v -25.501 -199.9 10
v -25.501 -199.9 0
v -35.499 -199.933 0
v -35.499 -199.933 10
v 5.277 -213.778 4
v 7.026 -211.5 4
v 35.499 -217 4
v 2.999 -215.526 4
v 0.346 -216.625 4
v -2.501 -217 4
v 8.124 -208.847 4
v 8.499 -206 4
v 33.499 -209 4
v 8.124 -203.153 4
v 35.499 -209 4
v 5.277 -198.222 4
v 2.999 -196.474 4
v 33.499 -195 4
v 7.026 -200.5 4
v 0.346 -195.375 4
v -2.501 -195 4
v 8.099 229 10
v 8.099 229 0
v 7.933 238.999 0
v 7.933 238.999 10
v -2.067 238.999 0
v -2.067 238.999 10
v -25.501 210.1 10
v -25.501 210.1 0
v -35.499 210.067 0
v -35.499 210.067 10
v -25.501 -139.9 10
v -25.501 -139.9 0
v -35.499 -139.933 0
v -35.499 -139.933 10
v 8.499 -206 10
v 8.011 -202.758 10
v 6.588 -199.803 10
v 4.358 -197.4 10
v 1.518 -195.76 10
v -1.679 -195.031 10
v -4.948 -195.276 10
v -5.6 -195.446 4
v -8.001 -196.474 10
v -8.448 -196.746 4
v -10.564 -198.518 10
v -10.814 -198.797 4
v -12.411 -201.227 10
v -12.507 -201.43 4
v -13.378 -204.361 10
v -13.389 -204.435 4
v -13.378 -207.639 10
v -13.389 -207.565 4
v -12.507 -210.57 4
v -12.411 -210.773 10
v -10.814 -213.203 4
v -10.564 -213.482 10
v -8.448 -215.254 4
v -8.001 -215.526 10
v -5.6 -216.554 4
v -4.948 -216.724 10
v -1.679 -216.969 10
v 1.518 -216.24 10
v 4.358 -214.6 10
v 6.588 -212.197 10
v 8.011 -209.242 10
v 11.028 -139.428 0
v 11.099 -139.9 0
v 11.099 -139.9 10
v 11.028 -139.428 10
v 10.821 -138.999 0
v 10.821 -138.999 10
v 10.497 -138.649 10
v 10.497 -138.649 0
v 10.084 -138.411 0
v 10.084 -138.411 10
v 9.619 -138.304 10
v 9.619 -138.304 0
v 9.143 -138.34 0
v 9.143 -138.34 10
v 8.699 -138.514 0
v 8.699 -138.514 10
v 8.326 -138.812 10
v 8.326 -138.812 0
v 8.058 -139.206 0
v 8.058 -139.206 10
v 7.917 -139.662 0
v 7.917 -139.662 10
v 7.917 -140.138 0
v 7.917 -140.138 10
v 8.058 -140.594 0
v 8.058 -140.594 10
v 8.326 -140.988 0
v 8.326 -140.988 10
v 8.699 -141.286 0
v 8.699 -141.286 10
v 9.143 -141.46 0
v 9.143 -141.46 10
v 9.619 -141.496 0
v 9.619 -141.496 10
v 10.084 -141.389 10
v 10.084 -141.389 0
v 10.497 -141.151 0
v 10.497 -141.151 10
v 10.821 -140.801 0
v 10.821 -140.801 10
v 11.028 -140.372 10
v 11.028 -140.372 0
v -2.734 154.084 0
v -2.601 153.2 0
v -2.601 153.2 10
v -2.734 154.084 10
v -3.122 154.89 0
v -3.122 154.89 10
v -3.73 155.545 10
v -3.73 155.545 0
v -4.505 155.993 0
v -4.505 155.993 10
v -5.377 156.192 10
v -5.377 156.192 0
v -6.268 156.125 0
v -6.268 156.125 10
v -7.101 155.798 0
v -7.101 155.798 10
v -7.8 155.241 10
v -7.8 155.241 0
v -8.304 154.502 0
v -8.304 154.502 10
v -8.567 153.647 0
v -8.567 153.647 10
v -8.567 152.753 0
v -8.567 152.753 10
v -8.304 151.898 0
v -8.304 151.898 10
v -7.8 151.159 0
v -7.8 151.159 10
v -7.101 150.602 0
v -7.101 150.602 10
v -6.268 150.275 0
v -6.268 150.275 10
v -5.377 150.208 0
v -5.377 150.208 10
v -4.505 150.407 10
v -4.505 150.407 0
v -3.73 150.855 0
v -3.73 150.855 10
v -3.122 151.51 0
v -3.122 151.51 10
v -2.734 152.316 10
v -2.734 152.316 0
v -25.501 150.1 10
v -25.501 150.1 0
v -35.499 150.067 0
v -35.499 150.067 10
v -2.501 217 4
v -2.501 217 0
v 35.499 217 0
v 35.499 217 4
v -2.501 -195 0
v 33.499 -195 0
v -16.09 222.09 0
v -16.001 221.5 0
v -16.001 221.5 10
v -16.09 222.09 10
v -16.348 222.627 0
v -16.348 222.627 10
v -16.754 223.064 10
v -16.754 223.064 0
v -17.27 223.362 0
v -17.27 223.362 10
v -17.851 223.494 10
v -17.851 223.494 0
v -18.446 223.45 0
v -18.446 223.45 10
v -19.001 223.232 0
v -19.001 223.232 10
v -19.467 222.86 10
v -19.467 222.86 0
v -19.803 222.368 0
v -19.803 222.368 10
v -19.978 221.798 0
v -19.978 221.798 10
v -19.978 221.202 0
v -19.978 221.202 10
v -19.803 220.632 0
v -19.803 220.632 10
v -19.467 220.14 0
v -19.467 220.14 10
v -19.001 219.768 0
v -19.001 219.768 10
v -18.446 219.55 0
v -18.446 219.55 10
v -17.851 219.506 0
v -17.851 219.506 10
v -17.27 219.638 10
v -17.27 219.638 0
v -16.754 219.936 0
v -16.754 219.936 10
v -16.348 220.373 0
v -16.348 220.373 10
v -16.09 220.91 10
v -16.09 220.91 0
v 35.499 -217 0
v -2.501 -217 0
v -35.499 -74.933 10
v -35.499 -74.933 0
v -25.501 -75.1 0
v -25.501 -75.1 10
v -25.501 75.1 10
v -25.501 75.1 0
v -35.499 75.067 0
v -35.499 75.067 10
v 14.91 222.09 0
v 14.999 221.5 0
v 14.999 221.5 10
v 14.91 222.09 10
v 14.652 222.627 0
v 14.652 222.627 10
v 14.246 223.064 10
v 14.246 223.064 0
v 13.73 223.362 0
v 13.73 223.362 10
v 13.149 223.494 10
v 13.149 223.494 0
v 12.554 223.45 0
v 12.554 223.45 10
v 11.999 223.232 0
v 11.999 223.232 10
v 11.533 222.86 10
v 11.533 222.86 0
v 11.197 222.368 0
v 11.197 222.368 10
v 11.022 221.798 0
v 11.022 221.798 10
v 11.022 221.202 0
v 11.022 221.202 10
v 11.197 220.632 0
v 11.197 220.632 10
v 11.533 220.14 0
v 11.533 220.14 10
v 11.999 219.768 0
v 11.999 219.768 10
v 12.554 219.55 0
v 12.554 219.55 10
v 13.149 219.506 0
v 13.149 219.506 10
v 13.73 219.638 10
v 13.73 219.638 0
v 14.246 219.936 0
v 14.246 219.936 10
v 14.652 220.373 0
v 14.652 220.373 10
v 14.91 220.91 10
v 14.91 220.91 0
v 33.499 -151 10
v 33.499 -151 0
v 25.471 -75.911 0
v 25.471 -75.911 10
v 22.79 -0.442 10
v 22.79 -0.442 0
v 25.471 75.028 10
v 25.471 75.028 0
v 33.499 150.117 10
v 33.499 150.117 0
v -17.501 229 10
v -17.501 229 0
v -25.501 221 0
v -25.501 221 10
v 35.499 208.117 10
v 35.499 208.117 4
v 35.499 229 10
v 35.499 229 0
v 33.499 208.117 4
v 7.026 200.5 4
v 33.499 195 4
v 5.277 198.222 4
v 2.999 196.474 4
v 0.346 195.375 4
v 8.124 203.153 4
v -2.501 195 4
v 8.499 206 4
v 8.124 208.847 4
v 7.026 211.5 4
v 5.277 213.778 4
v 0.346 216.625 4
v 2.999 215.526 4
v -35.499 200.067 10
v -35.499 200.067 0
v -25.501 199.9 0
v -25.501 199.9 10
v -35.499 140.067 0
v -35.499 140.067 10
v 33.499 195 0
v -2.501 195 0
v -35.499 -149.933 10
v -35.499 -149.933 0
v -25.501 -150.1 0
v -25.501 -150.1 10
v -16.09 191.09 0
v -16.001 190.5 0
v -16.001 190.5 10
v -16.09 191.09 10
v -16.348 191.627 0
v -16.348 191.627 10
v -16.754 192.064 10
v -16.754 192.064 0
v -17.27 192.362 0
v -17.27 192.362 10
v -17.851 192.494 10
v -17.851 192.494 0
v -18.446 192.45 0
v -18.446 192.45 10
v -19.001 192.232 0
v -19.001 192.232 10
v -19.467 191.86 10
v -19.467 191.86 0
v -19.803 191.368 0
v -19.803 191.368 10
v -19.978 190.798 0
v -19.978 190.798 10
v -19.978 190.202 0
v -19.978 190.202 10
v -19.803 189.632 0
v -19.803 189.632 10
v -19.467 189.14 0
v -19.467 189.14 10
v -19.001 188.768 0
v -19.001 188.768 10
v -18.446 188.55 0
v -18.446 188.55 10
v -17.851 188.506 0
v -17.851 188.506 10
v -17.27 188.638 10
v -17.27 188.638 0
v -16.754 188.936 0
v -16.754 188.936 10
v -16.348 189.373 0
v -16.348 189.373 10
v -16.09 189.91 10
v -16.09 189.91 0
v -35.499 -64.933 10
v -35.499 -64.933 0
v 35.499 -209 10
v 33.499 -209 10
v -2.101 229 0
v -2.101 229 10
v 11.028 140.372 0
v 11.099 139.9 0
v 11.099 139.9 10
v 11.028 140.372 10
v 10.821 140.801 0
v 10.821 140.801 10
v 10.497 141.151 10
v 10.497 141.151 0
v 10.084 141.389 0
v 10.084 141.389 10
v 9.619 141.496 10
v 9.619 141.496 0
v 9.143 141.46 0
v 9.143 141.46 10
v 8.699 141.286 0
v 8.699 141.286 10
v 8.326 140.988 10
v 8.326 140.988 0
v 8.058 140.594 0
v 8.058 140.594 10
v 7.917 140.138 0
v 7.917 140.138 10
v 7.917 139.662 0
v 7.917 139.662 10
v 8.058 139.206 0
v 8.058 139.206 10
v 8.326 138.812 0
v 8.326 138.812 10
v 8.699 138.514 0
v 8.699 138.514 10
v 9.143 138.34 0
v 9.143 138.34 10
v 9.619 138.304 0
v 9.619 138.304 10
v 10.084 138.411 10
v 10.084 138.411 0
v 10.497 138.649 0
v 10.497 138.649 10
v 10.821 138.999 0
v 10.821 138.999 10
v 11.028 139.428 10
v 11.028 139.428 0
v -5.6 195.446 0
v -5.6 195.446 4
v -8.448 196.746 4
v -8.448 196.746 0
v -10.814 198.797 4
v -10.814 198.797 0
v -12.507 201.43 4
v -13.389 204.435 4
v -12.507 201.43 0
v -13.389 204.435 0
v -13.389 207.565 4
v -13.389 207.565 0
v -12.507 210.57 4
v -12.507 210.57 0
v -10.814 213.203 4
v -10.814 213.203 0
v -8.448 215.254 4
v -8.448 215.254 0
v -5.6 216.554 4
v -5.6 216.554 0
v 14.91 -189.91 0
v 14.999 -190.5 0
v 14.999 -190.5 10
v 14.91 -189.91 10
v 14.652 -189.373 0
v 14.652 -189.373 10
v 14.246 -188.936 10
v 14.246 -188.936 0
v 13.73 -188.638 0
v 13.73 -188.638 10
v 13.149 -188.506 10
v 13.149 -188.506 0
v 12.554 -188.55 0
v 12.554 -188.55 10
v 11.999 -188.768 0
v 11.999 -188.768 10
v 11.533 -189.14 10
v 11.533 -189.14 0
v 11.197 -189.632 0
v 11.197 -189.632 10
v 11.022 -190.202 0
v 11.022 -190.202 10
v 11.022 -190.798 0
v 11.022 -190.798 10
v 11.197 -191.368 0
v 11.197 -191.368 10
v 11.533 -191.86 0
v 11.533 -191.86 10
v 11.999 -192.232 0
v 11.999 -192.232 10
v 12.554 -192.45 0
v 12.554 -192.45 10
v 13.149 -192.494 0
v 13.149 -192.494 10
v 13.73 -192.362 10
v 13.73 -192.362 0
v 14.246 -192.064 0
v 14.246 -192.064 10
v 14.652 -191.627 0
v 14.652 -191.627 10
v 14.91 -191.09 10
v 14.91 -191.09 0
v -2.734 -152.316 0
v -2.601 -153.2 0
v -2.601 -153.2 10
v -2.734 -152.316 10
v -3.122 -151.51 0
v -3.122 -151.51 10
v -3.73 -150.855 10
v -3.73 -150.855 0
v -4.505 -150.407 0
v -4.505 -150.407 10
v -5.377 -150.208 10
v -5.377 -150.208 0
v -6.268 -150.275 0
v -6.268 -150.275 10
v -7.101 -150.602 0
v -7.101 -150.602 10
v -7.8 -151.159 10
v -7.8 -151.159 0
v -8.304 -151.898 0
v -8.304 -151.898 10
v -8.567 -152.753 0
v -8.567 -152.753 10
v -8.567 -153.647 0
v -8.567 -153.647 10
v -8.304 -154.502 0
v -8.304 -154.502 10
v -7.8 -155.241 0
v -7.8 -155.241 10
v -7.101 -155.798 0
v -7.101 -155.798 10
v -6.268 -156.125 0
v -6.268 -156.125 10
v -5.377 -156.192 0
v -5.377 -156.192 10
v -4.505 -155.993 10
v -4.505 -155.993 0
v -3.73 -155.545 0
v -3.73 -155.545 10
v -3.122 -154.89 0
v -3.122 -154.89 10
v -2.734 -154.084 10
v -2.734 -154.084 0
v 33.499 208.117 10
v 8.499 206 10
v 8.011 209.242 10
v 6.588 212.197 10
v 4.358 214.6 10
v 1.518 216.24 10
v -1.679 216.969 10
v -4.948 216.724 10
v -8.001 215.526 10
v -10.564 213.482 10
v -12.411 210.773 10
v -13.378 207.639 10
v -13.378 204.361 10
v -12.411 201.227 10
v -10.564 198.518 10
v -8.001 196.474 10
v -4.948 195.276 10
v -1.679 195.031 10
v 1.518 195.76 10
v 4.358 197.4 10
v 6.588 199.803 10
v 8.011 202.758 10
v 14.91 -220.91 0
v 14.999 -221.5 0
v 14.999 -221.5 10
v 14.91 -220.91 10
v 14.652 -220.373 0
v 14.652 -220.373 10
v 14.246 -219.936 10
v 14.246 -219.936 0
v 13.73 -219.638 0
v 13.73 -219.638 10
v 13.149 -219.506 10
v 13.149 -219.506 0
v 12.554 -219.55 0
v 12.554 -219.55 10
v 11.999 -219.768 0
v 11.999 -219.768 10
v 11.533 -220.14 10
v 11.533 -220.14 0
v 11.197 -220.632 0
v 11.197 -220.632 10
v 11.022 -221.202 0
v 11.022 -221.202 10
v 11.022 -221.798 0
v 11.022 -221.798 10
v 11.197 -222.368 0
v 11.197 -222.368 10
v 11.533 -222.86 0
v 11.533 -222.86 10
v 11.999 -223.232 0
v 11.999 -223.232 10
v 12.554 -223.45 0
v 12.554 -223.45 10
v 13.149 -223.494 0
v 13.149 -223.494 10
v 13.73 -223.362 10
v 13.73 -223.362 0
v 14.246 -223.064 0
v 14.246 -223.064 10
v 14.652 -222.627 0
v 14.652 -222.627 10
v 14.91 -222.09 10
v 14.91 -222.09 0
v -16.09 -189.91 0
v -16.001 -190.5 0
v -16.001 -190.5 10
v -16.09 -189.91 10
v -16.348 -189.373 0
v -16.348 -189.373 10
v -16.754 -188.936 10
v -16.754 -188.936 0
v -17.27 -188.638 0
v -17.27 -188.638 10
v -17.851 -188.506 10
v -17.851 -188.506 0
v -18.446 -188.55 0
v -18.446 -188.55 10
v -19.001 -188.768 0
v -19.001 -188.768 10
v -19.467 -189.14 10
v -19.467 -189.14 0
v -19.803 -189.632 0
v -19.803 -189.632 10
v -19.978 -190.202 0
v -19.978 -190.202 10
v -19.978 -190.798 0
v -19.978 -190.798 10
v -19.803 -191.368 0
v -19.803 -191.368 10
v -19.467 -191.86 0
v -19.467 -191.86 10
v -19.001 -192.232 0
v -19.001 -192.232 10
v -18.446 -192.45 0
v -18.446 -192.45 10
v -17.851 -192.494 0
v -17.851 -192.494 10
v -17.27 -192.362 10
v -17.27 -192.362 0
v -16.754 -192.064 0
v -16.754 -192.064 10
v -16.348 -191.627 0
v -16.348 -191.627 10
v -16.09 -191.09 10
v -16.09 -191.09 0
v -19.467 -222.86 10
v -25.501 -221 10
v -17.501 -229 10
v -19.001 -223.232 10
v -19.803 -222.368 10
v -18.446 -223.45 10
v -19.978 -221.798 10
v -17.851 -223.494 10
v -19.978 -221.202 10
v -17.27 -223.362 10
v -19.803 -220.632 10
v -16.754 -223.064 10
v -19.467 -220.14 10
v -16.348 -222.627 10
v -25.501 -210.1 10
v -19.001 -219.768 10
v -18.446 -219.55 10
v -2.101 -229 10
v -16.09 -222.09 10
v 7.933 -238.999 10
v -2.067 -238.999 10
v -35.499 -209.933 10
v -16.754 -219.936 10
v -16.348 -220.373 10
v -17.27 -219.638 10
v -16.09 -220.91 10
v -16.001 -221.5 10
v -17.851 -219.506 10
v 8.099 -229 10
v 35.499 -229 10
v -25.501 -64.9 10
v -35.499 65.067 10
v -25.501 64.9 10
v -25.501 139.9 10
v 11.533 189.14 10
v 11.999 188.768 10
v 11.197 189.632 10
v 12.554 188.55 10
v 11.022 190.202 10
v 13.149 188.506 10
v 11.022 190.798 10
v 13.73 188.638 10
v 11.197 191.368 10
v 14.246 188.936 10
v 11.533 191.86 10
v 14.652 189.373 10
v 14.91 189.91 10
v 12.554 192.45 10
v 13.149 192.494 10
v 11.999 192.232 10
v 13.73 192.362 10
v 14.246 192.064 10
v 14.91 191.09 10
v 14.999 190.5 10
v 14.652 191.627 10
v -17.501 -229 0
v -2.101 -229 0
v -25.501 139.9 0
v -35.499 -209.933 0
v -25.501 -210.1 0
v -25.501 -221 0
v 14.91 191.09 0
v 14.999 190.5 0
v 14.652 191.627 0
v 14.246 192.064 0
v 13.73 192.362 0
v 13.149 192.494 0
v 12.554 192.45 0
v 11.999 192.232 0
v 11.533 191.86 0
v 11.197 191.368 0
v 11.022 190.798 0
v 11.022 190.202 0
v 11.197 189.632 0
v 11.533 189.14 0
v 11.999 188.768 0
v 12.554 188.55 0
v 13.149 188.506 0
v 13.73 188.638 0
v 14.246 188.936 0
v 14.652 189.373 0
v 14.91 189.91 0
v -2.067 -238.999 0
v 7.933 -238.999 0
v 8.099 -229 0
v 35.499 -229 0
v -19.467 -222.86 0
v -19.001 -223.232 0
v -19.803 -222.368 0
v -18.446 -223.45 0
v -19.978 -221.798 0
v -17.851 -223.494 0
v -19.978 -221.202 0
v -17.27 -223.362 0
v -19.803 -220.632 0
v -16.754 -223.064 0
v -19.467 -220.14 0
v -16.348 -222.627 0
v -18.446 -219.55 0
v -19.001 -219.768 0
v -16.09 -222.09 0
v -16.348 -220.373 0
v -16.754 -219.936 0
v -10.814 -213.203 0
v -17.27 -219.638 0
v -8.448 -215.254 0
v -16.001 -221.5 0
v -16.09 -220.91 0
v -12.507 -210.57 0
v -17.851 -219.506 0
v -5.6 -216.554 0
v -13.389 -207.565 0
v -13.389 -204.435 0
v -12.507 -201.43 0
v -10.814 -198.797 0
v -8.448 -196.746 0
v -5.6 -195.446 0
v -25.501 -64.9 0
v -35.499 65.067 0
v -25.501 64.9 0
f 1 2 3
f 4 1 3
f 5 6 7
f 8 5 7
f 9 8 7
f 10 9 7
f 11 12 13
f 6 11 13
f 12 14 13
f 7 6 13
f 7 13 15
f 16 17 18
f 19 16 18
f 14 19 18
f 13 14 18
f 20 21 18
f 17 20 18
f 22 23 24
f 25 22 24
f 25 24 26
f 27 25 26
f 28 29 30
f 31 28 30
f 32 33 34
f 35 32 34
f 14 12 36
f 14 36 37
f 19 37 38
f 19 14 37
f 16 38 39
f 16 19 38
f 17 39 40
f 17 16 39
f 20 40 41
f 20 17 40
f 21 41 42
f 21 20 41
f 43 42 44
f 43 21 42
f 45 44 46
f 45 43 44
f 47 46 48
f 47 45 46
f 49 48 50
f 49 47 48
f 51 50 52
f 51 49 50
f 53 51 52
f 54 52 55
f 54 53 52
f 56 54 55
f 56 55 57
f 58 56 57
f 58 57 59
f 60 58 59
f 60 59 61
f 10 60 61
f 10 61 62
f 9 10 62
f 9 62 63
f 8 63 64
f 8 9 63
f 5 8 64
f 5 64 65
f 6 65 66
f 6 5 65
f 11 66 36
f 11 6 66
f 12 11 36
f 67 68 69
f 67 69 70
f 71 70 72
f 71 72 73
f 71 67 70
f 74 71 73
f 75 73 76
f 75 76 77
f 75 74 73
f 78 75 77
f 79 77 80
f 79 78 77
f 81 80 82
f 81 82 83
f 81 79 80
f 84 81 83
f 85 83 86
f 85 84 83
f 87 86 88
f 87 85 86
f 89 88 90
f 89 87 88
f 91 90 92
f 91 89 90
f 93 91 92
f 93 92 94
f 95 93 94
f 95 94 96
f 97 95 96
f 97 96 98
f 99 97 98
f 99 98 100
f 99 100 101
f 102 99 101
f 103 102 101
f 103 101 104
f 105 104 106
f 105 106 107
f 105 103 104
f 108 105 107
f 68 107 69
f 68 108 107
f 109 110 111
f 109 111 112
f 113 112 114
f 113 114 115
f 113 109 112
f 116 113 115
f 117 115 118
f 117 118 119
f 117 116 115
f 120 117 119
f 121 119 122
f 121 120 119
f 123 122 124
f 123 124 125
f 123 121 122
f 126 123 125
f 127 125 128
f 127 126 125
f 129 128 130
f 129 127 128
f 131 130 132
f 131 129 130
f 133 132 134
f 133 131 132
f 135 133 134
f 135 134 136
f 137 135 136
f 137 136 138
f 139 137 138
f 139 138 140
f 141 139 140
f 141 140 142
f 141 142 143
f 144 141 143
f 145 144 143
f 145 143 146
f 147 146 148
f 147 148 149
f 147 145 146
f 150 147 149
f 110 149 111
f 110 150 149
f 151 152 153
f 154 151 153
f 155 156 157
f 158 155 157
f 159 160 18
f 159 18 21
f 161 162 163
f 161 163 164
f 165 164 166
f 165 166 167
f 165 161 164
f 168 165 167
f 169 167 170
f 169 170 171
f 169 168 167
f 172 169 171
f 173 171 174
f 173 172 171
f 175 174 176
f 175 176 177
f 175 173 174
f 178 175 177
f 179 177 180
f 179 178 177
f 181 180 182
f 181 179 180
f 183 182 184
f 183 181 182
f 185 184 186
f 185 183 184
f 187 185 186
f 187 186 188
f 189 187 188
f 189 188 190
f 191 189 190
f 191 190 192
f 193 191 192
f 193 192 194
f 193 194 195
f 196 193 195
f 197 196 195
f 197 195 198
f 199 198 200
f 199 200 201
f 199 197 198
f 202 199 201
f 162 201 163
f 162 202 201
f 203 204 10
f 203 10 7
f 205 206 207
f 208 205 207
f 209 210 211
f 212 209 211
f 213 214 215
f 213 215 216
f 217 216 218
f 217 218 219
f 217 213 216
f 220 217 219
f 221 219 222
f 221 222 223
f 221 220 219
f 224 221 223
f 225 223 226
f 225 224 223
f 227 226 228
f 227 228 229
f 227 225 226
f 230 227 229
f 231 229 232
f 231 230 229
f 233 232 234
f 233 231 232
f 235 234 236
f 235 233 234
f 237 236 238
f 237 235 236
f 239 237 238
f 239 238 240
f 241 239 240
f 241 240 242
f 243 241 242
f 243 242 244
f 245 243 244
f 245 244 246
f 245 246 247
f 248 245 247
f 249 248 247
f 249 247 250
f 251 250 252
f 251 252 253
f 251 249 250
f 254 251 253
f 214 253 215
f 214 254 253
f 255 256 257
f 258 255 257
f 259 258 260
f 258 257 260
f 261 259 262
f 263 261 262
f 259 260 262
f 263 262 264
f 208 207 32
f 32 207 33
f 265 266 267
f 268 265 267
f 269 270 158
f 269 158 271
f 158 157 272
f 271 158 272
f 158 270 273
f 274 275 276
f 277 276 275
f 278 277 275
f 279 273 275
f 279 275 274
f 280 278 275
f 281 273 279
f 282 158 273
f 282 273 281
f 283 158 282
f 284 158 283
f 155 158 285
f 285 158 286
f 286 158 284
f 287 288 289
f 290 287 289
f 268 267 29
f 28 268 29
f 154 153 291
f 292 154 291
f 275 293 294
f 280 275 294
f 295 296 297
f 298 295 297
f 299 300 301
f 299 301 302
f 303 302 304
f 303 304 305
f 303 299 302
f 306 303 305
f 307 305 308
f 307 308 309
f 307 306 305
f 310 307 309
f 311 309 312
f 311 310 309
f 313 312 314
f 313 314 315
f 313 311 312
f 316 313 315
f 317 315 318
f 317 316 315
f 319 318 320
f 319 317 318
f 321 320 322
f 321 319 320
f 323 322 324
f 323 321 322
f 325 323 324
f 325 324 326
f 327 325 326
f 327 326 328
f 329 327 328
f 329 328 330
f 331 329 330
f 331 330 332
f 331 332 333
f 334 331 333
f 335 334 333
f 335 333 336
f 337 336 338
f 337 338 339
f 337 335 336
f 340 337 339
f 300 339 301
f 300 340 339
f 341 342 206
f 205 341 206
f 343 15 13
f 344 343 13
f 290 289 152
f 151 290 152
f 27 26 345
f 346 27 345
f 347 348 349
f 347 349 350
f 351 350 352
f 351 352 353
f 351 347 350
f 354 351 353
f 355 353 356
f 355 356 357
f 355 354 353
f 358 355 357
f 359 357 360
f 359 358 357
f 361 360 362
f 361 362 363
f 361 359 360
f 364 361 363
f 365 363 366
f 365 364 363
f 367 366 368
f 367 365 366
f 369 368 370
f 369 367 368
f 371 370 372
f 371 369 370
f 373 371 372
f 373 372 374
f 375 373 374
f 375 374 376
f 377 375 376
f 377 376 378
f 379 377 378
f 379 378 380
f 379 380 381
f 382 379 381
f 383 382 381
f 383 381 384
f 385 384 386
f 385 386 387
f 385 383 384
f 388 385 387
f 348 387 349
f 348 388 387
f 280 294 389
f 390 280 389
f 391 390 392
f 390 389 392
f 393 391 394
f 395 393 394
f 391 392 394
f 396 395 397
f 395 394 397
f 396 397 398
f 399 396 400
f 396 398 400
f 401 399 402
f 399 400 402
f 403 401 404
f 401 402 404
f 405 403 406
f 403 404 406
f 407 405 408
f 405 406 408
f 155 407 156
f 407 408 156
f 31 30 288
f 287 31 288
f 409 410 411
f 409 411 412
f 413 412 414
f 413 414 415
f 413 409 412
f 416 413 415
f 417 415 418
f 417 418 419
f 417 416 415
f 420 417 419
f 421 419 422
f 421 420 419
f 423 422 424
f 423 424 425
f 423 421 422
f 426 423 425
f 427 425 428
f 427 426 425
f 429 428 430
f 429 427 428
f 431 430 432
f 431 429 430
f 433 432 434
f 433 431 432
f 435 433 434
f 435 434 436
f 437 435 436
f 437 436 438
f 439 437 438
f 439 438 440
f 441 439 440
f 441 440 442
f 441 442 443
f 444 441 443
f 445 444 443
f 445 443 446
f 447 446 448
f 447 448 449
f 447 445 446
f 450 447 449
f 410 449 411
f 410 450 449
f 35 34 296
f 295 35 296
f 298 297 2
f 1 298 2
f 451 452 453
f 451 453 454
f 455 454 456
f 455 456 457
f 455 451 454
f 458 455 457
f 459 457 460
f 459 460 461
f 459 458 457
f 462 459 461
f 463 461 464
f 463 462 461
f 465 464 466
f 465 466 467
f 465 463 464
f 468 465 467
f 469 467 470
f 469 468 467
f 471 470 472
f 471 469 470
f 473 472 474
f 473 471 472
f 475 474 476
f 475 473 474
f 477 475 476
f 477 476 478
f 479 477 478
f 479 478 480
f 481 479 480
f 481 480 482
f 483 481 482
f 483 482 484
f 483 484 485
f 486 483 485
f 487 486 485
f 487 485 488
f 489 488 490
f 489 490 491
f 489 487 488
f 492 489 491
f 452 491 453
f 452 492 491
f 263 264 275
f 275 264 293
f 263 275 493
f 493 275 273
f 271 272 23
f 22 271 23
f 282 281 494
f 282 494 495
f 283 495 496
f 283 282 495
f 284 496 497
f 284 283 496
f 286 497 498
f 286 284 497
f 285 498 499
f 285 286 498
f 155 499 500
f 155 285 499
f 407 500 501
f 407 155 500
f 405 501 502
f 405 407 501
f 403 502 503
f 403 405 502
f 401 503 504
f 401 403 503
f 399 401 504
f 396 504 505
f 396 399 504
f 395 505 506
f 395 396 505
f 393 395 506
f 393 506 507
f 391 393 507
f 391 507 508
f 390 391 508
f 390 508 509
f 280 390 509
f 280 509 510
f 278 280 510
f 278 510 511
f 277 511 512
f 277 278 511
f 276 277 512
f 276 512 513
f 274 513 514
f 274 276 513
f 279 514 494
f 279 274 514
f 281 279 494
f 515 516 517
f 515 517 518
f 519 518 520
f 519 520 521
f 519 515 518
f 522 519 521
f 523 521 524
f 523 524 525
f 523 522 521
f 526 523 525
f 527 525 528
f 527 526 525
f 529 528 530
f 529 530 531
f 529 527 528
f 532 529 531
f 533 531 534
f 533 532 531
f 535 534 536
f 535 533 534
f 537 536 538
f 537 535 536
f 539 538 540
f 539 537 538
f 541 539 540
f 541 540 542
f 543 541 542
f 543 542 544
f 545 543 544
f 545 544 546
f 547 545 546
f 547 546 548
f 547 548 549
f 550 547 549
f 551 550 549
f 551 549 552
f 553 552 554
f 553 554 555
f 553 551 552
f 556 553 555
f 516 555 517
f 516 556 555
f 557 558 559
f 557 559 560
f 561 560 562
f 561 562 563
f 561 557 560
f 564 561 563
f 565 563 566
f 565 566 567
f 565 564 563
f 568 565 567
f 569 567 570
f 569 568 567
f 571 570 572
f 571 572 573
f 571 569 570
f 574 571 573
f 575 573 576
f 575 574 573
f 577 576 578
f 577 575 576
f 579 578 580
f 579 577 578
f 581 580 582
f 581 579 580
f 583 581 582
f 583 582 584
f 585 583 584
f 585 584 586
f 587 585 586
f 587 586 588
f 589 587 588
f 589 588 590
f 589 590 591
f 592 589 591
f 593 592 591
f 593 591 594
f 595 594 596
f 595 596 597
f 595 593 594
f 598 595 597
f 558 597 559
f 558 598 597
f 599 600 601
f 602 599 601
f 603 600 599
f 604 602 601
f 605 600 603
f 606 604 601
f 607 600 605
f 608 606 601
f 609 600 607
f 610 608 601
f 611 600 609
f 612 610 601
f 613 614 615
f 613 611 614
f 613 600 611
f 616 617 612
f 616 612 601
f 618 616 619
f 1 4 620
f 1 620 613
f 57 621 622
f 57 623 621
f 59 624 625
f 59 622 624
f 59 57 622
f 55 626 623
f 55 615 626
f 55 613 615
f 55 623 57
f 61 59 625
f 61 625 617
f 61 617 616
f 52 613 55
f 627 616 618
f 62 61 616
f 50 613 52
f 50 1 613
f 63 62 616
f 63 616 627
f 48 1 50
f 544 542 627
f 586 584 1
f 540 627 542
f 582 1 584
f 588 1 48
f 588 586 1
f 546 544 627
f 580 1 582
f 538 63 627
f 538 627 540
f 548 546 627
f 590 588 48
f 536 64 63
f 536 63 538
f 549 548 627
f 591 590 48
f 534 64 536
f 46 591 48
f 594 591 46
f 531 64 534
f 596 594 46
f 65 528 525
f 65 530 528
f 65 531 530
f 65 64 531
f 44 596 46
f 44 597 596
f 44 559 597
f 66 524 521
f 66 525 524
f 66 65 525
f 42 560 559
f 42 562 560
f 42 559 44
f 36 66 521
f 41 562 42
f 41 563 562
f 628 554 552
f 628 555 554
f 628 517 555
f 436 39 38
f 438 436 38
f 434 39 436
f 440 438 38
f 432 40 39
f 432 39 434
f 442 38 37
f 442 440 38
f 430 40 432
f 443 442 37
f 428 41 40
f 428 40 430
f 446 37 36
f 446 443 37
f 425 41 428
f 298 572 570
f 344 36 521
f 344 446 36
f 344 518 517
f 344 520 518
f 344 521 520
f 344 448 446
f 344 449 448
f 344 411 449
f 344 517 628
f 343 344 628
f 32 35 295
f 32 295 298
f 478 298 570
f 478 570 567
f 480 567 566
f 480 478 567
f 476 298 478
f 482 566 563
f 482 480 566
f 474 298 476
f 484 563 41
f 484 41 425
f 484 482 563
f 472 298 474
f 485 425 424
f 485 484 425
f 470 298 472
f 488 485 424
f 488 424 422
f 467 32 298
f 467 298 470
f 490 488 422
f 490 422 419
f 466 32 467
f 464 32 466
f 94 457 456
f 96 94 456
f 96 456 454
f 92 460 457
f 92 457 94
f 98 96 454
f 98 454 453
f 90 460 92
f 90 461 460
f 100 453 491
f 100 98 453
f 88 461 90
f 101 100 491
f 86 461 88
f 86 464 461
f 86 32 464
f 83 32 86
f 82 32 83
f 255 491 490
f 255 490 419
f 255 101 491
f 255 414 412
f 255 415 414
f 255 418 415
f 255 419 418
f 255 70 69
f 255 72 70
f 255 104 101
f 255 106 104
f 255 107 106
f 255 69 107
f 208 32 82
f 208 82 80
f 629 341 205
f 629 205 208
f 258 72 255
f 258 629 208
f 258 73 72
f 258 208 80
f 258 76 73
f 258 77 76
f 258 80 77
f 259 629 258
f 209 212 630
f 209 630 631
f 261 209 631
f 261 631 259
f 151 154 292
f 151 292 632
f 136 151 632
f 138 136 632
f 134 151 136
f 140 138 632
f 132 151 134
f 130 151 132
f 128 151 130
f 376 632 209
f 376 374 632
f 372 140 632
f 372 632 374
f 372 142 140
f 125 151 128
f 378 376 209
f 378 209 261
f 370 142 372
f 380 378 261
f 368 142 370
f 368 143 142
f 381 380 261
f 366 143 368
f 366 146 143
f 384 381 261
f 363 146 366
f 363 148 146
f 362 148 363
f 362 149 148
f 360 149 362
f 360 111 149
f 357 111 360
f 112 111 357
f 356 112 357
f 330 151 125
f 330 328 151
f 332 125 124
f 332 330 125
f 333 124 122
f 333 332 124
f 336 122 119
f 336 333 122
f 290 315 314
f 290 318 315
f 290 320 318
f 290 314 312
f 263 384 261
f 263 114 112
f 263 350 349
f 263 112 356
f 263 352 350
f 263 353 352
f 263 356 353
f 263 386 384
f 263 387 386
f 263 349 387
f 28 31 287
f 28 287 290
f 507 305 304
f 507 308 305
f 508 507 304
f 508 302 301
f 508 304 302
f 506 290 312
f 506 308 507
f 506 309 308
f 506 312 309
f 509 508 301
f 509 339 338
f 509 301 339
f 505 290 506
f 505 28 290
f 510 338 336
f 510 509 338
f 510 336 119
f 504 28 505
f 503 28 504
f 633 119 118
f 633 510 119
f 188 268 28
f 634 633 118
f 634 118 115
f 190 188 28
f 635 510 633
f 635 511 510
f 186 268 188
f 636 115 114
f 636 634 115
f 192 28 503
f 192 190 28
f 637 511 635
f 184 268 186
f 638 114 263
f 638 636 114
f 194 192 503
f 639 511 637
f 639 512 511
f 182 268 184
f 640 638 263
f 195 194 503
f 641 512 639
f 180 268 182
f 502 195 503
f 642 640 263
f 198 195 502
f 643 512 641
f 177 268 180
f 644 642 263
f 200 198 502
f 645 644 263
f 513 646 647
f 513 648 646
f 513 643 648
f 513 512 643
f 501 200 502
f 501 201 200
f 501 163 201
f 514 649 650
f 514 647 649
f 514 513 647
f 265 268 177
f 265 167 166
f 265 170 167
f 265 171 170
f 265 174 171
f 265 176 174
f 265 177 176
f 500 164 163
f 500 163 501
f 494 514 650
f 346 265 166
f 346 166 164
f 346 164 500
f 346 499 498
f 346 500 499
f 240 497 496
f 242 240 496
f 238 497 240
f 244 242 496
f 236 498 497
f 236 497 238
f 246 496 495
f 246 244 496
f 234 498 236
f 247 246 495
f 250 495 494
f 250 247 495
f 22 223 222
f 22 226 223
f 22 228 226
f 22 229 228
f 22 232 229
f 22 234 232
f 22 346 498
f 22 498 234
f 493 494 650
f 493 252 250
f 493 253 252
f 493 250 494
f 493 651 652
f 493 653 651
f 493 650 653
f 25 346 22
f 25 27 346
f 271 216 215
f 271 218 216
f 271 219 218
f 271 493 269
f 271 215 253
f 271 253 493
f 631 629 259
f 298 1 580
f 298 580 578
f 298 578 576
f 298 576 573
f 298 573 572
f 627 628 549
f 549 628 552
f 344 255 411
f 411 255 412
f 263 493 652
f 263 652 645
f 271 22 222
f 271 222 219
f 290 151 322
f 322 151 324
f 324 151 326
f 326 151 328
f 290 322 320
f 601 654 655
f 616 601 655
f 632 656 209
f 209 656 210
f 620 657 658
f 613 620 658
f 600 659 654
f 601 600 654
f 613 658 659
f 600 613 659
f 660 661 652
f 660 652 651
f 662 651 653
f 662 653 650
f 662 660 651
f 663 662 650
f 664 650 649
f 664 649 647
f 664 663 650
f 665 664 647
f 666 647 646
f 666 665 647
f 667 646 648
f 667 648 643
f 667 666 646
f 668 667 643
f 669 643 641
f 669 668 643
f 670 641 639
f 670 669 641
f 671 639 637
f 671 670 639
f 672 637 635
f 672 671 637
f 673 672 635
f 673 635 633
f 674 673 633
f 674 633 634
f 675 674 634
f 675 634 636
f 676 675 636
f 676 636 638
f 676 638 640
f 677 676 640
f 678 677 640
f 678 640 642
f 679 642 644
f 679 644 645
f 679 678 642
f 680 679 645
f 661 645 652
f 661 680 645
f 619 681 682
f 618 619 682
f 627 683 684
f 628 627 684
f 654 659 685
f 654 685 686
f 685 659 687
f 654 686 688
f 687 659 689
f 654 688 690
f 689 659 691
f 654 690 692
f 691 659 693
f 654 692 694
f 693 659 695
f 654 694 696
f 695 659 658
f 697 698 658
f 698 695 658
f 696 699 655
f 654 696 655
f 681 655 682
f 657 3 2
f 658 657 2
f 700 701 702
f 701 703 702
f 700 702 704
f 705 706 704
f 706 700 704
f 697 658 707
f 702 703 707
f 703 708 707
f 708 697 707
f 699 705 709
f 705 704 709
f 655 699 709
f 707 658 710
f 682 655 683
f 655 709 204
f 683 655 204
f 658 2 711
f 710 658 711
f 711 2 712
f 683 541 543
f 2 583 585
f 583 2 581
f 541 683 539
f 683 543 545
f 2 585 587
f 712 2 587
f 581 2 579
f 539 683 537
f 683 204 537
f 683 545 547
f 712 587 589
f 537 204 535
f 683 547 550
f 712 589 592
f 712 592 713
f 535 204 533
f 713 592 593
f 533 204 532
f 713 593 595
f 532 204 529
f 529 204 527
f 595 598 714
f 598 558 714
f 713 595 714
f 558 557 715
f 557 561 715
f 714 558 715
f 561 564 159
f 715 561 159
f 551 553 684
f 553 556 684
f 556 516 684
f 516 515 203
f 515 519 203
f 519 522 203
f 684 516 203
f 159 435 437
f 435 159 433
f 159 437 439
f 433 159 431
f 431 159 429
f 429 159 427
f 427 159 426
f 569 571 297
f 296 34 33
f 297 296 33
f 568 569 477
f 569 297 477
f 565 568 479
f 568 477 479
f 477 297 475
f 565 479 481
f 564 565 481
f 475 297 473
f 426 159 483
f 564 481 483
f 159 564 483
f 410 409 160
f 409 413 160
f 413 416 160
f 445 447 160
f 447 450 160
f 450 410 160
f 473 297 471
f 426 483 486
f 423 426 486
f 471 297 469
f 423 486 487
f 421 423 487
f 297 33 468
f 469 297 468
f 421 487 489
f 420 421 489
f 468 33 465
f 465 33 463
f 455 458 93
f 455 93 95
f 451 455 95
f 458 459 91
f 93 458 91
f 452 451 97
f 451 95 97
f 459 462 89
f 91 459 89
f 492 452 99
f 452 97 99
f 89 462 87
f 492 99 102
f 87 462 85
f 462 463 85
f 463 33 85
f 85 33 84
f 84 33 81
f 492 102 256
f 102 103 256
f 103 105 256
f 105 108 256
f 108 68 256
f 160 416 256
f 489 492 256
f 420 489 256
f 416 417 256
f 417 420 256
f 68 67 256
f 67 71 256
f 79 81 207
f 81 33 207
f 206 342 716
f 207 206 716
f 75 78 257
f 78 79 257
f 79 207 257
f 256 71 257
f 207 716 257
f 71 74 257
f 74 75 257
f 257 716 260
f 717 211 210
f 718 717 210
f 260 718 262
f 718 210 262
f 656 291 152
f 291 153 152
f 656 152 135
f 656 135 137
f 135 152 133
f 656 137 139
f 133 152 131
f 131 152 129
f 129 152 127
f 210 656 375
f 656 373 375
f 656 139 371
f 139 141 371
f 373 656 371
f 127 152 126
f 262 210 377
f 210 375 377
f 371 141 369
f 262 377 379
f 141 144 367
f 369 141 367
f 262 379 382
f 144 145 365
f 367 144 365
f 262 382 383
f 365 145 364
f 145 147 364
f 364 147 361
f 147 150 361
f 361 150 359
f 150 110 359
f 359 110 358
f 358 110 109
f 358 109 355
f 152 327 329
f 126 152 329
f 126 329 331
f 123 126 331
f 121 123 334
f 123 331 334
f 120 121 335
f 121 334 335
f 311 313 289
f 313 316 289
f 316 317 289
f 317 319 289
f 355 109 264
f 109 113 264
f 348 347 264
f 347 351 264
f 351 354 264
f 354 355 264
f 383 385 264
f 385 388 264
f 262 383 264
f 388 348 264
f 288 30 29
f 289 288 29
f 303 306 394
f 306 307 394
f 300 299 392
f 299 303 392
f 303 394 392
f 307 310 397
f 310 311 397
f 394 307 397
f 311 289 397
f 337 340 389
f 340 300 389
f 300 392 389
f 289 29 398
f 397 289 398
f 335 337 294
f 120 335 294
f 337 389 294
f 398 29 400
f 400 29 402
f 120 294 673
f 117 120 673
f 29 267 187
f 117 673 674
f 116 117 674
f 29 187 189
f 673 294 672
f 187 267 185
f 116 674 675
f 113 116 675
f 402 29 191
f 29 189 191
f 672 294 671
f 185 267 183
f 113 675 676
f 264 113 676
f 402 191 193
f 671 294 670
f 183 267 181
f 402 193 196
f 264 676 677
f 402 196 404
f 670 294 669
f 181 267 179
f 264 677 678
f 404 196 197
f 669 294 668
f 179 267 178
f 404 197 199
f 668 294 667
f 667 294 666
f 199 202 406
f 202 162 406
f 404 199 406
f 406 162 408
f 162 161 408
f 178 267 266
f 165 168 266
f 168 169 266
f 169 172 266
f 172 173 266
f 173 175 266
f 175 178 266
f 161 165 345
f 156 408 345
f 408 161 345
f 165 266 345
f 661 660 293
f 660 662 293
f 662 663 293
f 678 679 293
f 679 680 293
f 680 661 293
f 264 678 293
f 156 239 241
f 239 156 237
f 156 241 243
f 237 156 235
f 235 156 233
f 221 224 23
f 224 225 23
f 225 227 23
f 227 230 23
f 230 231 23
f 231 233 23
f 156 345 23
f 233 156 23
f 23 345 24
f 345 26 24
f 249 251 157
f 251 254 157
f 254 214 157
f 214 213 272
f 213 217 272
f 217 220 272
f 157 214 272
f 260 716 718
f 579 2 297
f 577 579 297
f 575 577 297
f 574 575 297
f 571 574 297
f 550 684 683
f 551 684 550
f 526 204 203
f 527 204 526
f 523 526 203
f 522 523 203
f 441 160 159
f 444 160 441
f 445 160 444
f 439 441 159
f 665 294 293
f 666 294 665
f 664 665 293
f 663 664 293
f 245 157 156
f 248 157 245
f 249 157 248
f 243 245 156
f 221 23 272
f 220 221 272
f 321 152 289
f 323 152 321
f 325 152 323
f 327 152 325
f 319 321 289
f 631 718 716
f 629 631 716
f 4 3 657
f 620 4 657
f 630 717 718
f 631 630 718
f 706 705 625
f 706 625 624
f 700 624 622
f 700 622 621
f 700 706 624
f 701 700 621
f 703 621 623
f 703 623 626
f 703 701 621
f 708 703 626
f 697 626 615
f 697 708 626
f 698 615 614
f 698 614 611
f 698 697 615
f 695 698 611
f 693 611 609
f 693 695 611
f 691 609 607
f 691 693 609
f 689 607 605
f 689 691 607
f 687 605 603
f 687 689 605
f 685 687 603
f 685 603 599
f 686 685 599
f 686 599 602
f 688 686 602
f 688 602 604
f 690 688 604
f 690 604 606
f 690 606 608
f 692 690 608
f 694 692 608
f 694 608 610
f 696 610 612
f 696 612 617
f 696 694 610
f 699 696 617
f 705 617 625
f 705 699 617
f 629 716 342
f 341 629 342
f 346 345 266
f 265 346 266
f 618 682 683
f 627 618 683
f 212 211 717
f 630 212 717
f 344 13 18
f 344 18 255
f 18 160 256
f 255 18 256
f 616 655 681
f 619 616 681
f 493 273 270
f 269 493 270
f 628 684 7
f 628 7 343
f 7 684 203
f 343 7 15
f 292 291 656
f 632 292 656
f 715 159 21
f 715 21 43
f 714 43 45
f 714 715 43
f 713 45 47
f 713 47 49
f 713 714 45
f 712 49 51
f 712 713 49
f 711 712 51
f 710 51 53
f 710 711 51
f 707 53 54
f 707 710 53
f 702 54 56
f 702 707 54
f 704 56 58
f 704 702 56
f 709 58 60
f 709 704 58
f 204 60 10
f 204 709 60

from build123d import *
from build123d.topology import SkipClean

# Parameters (mm, degrees)
SKETCH_2_R          = 2
SKETCH_2_R_2        = 11
SKETCH_2_R_3        = 3
SKETCH_2_R_4        = 1.6
EXTRUDE_1_DEPTH     = 10
CUT_EXTRUDE_2_DEPTH = 4


with BuildPart() as part:
    # Эскиз2 → Бобышка-Вытянуть1 (new body)
    with BuildSketch(Plane.XY):
        with BuildLine():
            Line((-25.5006943, 139.9), (-25.5006943, 109.05))
            Line((-25.5006943, 109.05), (-25.5006943, 75.100000001))
            Line((-25.5006943, 75.100000001), (-35.4993057, 75.066643523))
            Line((-35.4993057, 75.066643523), (-35.4993057, 65.066643523))
            Line((-35.4993057, 65.066643523), (-25.5006943, 64.9))
            Line((-25.5006943, 64.9), (-25.5006943, -64.899999999))
            Line((-25.5006943, -64.899999999), (-35.4993057, -64.933356477))
            Line((-35.4993057, -64.933356477), (-35.4993057, -74.933356477))
            Line((-35.4993057, -74.933356477), (-25.5006943, -75.1))
            Line((-25.5006943, -75.1), (-25.5006943, -105.95))
            Line((-25.5006943, -105.95), (-25.5006943, -139.899999999))
            Line((-25.5006943, -139.899999999), (-35.4993057, -139.933356477))
            Line((-35.4993057, -139.933356477), (-35.4993057, -149.933356477))
            Line((-35.4993057, -149.933356477), (-25.5006943, -150.1))
            Line((-25.5006943, -150.1), (-25.5006943, -173.45))
            Line((-25.5006943, -173.45), (-25.5006943, -199.899999999))
            Line((-25.5006943, -199.899999999), (-35.4993057, -199.933356477))
            Line((-35.4993057, -199.933356477), (-35.4993057, -209.933356477))
            Line((-35.4993057, -209.933356477), (-25.5006943, -210.1))
            Line((-25.5006943, -210.1), (-25.5006943, -221))
            Line((-25.5006943, -221), (-17.5006943, -229))
            Line((-17.5006943, -229), (-2.1006943, -229))
            Line((-2.1006943, -229), (-2.067337824, -238.9986114))
            Line((-2.067337824, -238.9986114), (7.932662176, -238.9986114))
            Line((7.932662176, -238.9986114), (8.099305701, -229))
            Line((8.099305701, -229), (35.4993057, -229))
            Line((35.4993057, -229), (35.4993057, -209))
            Line((35.4993057, -209), (33.4993057, -209))
            Line((33.4993057, -209), (33.4993057, -151))
            ThreePointArc((33.4993057, -151), (22.78974844, -0.441666666), (33.4993057, 150.116666668))
            Line((33.4993057, 150.116666668), (33.4993057, 208.116666668))
            Line((33.4993057, 208.116666668), (35.4993057, 208.116666668))
            Line((35.4993057, 208.116666668), (35.4993057, 229))
            Line((35.4993057, 229), (8.099305701, 229))
            Line((8.099305701, 229), (7.932662176, 238.9986114))
            Line((7.932662176, 238.9986114), (-2.067337824, 238.9986114))
            Line((-2.067337824, 238.9986114), (-2.1006943, 229))
            Line((-2.1006943, 229), (-17.5006943, 229))
            Line((-17.5006943, 229), (-25.5006943, 221))
            Line((-25.5006943, 221), (-25.5006943, 210.100000001))
            Line((-25.5006943, 210.100000001), (-35.4993057, 210.066643523))
            Line((-35.4993057, 210.066643523), (-35.4993057, 200.066643523))
            Line((-35.4993057, 200.066643523), (-25.5006943, 199.9))
            Line((-25.5006943, 199.9), (-25.5006943, 176.55))
            Line((-25.5006943, 176.55), (-25.5006943, 150.100000001))
            Line((-25.5006943, 150.100000001), (-35.4993057, 150.066643523))
            Line((-35.4993057, 150.066643523), (-35.4993057, 140.066643523))
            Line((-35.4993057, 140.066643523), (-25.5006943, 139.9))
        make_face()
        with Locations((-18.0006943, -190.5)):
            Circle(SKETCH_2_R, mode=Mode.SUBTRACT)
        with Locations((-18.0006943, -221.5)):
            Circle(SKETCH_2_R, mode=Mode.SUBTRACT)
        with Locations((-18.0006943, 190.5)):
            Circle(SKETCH_2_R, mode=Mode.SUBTRACT)
        with Locations((12.9993057, 221.5)):
            Circle(SKETCH_2_R, mode=Mode.SUBTRACT)
        with Locations((-2.5006943, -206)):
            Circle(SKETCH_2_R_2, mode=Mode.SUBTRACT)
        with Locations((-2.5006943, 206)):
            Circle(SKETCH_2_R_2, mode=Mode.SUBTRACT)
        with Locations((-18.0006943, 221.5)):
            Circle(SKETCH_2_R, mode=Mode.SUBTRACT)
        with Locations((12.9993057, -221.5)):
            Circle(SKETCH_2_R, mode=Mode.SUBTRACT)
        with Locations((12.9993057, -190.5)):
            Circle(SKETCH_2_R, mode=Mode.SUBTRACT)
        with Locations((12.9993057, 190.5)):
            Circle(SKETCH_2_R, mode=Mode.SUBTRACT)
        with Locations((-5.6006943, -153.2)):
            Circle(SKETCH_2_R_3, mode=Mode.SUBTRACT)
        with Locations((-5.6006943, 153.2)):
            Circle(SKETCH_2_R_3, mode=Mode.SUBTRACT)
        with Locations((9.4993057, -139.899999999)):
            Circle(SKETCH_2_R_4, mode=Mode.SUBTRACT)
        with Locations((9.4993057, 139.9)):
            Circle(SKETCH_2_R_4, mode=Mode.SUBTRACT)
    extrude(amount=EXTRUDE_1_DEPTH)

    # Эскиз4 → Вырез-Вытянуть2 (cut)
    with SkipClean():  # the faces are left unmerged after this step: merging them gives an invalid solid
        with BuildSketch(Plane.XY):
            with BuildLine():
                Line((-2.5006943, 217), (35.4993057, 217))
                Line((35.4993057, 217), (35.4993057, 195))
                Line((35.4993057, 195), (-2.5006943, 195))
                ThreePointArc((-2.5006943, 195), (-13.5006943, 206), (-2.5006943, 217))
            make_face()
            with BuildLine():
                Line((-2.5006943, -217), (35.4993057, -217))
                Line((35.4993057, -217), (35.4993057, -195))
                Line((35.4993057, -195), (-2.5006943, -195))
                ThreePointArc((-2.5006943, -195), (-13.5006943, -206), (-2.5006943, -217))
            make_face()
        extrude(amount=CUT_EXTRUDE_2_DEPTH, mode=Mode.SUBTRACT)


solid = part.part
